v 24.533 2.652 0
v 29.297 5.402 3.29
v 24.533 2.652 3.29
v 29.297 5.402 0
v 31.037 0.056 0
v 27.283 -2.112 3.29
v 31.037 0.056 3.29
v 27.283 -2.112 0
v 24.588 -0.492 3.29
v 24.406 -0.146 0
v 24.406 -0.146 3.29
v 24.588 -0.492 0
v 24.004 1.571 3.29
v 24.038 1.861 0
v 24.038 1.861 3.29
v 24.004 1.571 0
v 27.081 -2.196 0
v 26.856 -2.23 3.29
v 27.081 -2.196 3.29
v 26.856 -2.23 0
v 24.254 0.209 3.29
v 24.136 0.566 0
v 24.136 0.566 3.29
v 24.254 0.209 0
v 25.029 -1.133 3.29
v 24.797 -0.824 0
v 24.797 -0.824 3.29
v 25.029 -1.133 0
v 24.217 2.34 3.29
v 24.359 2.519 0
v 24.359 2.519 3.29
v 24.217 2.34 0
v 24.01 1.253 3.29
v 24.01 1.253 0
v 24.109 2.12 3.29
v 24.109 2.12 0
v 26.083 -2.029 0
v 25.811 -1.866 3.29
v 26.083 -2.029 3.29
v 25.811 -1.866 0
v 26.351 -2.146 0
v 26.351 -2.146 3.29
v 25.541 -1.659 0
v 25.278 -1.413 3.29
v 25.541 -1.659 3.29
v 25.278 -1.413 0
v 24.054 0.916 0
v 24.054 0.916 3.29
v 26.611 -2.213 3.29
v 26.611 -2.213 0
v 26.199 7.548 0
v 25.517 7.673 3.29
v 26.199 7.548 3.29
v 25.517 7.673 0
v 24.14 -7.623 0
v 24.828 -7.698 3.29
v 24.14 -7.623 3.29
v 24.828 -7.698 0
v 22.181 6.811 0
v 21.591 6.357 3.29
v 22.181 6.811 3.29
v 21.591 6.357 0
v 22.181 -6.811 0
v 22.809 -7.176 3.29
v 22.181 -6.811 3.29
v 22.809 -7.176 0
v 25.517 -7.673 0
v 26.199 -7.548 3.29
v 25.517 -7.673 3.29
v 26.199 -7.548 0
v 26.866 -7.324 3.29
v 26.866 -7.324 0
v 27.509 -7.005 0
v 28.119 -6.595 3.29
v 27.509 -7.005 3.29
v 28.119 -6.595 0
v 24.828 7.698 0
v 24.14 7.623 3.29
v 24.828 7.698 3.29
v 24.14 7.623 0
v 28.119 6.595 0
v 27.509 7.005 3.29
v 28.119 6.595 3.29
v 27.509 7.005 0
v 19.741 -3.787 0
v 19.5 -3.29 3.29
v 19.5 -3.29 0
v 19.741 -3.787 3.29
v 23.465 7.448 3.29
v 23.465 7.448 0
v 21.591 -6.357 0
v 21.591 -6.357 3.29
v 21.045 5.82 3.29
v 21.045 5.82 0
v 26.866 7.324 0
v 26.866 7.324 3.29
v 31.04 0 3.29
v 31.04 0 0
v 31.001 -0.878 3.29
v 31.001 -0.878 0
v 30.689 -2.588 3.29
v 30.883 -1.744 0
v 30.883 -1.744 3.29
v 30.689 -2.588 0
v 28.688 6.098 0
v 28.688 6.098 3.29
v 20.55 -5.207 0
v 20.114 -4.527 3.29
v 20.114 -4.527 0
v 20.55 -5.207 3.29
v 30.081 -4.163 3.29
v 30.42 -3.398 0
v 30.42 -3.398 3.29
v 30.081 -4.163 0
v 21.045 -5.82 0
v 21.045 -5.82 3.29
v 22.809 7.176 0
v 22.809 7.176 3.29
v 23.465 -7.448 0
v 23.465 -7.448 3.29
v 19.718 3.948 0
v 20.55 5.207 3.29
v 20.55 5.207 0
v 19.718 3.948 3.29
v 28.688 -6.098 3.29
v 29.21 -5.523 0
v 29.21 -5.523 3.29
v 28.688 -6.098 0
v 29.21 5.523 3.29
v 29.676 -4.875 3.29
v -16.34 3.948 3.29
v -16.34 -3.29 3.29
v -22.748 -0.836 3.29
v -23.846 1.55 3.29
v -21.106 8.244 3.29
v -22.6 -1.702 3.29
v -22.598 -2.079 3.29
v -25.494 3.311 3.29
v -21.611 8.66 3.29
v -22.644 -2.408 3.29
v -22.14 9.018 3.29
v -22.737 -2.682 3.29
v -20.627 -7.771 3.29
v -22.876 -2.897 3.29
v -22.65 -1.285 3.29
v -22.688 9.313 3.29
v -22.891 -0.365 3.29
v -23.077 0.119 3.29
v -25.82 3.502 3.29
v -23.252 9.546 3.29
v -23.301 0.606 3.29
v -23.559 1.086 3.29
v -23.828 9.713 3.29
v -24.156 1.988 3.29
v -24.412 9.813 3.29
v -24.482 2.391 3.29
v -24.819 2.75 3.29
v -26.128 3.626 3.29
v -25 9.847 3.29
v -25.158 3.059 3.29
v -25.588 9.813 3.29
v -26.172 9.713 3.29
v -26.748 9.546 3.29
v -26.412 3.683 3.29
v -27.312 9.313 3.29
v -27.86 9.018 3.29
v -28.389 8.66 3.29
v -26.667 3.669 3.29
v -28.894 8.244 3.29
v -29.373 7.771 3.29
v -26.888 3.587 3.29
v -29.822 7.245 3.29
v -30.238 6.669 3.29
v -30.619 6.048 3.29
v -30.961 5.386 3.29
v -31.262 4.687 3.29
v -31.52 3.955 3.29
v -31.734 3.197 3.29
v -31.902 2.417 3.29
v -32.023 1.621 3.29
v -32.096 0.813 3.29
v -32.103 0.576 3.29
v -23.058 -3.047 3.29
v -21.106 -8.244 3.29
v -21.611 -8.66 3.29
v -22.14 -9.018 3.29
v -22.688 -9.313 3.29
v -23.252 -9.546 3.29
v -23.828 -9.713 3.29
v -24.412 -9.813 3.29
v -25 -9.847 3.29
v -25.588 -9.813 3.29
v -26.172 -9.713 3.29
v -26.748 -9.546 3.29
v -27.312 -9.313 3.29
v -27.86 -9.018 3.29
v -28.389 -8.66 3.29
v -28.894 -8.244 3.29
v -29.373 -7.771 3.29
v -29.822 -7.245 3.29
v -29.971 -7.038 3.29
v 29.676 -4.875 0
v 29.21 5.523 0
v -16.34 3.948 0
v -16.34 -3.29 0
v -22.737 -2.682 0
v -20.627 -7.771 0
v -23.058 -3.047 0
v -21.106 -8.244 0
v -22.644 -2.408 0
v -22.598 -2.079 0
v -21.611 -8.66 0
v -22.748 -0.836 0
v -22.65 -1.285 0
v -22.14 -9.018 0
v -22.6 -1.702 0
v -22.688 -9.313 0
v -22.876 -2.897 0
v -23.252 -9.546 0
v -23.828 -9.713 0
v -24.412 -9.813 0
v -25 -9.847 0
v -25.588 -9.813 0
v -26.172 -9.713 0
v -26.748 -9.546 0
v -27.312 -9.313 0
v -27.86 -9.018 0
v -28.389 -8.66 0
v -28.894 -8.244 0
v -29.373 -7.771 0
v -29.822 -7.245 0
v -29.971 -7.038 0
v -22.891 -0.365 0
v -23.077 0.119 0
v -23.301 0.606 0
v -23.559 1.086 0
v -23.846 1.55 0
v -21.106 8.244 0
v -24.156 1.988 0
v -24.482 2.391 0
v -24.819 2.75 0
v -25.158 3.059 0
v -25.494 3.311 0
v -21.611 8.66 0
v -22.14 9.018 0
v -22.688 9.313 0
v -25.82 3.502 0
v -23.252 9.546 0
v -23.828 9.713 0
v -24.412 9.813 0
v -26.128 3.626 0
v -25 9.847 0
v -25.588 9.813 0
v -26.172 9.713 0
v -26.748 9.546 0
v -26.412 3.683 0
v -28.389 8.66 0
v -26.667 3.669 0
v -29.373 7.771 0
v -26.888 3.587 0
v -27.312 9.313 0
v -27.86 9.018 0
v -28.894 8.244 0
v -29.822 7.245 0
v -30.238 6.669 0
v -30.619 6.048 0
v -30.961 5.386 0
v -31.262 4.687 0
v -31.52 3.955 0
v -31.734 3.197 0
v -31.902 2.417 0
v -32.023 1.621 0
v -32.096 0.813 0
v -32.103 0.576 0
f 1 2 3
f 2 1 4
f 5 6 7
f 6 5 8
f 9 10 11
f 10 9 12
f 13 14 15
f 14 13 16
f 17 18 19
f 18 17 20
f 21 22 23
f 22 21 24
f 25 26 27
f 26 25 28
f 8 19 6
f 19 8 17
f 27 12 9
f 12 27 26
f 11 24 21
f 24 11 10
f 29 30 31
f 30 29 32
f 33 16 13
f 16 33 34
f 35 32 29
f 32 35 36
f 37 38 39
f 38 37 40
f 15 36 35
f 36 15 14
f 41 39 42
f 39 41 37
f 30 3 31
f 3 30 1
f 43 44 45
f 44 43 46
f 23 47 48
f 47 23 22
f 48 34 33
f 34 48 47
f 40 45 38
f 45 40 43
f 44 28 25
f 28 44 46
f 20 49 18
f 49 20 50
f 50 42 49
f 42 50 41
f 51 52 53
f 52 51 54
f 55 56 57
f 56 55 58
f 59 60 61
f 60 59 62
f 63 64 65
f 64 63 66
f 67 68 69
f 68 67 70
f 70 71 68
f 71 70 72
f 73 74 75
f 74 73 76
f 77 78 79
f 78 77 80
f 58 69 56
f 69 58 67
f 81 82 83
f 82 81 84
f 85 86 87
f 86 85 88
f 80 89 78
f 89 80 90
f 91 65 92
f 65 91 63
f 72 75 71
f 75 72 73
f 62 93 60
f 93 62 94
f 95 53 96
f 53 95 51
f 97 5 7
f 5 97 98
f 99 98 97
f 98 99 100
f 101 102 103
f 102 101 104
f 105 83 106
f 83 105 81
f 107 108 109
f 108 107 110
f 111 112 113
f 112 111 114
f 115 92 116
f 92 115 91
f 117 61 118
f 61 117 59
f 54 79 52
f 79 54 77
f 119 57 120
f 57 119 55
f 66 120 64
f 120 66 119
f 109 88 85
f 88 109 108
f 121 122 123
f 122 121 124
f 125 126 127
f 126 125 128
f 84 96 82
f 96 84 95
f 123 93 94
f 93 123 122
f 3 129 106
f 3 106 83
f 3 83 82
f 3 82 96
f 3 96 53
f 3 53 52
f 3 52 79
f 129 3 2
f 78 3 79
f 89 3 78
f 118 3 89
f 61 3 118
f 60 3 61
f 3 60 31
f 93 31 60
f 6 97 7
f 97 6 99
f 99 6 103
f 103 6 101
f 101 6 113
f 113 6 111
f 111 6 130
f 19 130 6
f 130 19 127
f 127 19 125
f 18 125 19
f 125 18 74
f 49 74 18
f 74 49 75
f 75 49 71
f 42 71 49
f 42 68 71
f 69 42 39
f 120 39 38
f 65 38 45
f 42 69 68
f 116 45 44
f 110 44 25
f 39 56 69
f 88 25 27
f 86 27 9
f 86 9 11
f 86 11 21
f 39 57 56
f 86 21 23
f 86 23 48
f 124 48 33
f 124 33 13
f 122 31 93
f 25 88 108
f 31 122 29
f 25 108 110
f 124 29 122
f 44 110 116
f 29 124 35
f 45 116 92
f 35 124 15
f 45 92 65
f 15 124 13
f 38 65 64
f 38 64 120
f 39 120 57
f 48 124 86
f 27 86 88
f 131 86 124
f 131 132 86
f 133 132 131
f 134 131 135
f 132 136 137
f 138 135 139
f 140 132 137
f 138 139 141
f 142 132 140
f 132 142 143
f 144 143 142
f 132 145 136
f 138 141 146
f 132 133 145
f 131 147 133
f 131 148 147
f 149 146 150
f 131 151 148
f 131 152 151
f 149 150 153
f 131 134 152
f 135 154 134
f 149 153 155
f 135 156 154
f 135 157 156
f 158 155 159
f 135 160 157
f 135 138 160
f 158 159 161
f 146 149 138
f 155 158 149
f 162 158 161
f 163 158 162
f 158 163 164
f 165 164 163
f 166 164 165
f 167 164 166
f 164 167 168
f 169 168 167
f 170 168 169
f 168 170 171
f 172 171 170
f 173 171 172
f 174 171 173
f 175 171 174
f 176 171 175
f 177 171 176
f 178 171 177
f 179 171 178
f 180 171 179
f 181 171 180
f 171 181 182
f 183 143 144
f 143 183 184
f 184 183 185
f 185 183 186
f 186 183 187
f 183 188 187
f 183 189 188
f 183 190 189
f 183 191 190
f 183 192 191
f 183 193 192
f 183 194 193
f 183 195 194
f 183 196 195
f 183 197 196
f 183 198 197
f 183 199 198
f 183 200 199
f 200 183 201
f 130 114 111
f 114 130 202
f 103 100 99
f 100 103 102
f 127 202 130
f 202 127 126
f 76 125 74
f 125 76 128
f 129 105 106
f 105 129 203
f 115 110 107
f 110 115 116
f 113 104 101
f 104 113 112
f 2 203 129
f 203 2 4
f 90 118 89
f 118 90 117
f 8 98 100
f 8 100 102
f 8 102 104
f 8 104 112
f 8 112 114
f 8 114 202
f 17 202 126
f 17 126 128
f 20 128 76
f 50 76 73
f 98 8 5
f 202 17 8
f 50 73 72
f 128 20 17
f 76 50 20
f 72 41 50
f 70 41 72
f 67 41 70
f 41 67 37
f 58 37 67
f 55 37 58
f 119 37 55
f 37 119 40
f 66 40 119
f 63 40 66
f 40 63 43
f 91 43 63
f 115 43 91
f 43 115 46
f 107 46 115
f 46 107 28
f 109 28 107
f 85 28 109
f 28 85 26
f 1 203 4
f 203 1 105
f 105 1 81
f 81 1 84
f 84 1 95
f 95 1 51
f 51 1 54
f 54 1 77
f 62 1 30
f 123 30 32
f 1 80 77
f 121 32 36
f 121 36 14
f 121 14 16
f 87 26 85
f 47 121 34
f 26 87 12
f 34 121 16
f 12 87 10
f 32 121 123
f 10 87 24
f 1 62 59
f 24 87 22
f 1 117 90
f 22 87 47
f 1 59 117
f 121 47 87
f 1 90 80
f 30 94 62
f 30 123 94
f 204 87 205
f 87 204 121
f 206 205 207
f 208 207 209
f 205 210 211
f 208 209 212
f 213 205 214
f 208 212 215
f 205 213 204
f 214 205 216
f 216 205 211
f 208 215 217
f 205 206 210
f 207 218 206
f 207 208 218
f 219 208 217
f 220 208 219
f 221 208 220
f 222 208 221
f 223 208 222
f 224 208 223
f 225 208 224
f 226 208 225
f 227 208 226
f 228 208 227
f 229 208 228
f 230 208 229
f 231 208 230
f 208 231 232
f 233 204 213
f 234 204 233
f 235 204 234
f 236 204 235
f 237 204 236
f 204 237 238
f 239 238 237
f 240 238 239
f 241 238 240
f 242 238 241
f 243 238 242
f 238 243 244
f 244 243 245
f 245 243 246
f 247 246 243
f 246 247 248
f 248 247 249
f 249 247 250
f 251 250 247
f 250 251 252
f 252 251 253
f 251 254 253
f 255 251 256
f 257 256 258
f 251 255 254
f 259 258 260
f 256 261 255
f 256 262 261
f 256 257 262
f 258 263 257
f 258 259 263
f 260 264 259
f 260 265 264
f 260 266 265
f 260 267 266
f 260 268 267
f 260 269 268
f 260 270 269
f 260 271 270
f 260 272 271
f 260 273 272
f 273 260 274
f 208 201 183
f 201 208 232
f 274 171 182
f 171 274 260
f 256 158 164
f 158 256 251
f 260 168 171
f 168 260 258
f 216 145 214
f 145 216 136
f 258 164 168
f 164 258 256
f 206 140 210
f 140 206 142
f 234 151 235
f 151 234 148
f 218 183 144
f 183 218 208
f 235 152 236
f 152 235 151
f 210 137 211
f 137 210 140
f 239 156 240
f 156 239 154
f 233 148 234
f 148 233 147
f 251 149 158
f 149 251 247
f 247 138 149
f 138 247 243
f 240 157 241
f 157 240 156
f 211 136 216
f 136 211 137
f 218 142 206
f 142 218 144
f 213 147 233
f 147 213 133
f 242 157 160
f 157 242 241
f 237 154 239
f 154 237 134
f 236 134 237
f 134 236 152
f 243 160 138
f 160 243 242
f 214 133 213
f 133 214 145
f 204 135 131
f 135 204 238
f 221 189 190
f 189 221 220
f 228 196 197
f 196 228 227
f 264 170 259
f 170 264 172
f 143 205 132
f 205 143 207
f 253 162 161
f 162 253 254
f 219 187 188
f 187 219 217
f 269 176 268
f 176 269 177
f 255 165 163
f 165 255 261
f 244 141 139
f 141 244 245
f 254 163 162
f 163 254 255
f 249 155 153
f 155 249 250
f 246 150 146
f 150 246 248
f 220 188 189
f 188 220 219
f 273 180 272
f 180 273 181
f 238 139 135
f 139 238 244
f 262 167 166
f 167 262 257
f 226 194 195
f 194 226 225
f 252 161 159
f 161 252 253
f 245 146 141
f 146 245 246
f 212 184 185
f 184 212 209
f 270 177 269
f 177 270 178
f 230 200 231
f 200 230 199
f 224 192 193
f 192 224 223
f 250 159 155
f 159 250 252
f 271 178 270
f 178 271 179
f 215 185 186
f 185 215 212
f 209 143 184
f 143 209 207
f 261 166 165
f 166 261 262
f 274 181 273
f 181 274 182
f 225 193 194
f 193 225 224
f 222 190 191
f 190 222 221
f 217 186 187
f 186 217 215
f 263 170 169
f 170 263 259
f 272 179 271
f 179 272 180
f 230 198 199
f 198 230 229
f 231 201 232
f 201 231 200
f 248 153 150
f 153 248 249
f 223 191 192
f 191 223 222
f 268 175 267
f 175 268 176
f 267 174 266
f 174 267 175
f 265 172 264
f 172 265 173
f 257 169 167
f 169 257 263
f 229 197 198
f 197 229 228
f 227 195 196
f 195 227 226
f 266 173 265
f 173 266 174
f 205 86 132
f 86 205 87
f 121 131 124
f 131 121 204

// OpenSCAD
//Specify the distance between the centers of the inserts
wrench_length = 50;

//The size of the insert on the right side
insert_size_a = 5.5;

//The size of the insert on the left side
insert_size_b = 7.66;

// preview[view:south, tilt:top]

/* [hidden] */
wrench_thickness = (insert_size_a + insert_size_b) / 4;
offset = wrench_thickness;

module insert(insert)
{
    /*
    linear_extrude(height=10,convexity=10)
    polygon(points=[[-insert/2,0],[0,insert/2],[insert+wrench_thickness,insert/2],[insert+wrench_thickness,-insert/2],[0,-insert/2]]);
    */
    
    union()
    {
        translate([-insert/2,-insert/2,0])
        cube([insert + wrench_thickness,insert,wrench_thickness+1]);
        
        translate([-insert/2,0,0])
        scale([1.25 + insert/20,insert/2,1])
        cylinder(r=1,h=wrench_thickness+1,$fn=44);
    }
}

difference()
{
    hull()
    {
        translate([wrench_length/2,0,0])
        scale([1,1 + insert_size_a/20,1])
        cylinder(r=insert_size_a/2 + wrench_thickness,h=wrench_thickness,$fn=insert_size_a*10);

        translate([wrench_length/2 - insert_size_a,-(insert_size_a + insert_size_b)/4,0])
        cube([1,(insert_size_a*1.05 + insert_size_b*1.05)/2,wrench_thickness]);
    }

    translate([wrench_length/2 + offset,offset/2,-0.5])
    rotate([0,0,30])
    {
        insert(insert_size_a);
    }
}

difference()
{
    hull()
    {
        translate([-wrench_length/2,0,0])
        scale([1,1 + insert_size_b/20,1])
        cylinder(r=insert_size_b/2 + wrench_thickness,h=wrench_thickness,$fn=insert_size_b*10);

        translate([-(wrench_length/2 - insert_size_b),-(insert_size_a + insert_size_b)/4,0])
        cube([1,(insert_size_a*1.1 + insert_size_b*1.1)/2,wrench_thickness]);
    }
    
    translate([-wrench_length/2 - offset, -offset/2,-0.5])
    rotate([0,0,30 + 180])
    {
        insert(insert_size_b);
    }
}

hull()
{
    translate([wrench_length/2 - insert_size_a,-(insert_size_a + insert_size_b)/4,0])
    cube([1,(insert_size_a*1.1 + insert_size_b*1.1)/2,wrench_thickness]);

    translate([-(wrench_length/2 - insert_size_b),-(insert_size_a + insert_size_b)/4,0])
    cube([1,(insert_size_a*1.1 + insert_size_b*1.1)/2,wrench_thickness]);
}
